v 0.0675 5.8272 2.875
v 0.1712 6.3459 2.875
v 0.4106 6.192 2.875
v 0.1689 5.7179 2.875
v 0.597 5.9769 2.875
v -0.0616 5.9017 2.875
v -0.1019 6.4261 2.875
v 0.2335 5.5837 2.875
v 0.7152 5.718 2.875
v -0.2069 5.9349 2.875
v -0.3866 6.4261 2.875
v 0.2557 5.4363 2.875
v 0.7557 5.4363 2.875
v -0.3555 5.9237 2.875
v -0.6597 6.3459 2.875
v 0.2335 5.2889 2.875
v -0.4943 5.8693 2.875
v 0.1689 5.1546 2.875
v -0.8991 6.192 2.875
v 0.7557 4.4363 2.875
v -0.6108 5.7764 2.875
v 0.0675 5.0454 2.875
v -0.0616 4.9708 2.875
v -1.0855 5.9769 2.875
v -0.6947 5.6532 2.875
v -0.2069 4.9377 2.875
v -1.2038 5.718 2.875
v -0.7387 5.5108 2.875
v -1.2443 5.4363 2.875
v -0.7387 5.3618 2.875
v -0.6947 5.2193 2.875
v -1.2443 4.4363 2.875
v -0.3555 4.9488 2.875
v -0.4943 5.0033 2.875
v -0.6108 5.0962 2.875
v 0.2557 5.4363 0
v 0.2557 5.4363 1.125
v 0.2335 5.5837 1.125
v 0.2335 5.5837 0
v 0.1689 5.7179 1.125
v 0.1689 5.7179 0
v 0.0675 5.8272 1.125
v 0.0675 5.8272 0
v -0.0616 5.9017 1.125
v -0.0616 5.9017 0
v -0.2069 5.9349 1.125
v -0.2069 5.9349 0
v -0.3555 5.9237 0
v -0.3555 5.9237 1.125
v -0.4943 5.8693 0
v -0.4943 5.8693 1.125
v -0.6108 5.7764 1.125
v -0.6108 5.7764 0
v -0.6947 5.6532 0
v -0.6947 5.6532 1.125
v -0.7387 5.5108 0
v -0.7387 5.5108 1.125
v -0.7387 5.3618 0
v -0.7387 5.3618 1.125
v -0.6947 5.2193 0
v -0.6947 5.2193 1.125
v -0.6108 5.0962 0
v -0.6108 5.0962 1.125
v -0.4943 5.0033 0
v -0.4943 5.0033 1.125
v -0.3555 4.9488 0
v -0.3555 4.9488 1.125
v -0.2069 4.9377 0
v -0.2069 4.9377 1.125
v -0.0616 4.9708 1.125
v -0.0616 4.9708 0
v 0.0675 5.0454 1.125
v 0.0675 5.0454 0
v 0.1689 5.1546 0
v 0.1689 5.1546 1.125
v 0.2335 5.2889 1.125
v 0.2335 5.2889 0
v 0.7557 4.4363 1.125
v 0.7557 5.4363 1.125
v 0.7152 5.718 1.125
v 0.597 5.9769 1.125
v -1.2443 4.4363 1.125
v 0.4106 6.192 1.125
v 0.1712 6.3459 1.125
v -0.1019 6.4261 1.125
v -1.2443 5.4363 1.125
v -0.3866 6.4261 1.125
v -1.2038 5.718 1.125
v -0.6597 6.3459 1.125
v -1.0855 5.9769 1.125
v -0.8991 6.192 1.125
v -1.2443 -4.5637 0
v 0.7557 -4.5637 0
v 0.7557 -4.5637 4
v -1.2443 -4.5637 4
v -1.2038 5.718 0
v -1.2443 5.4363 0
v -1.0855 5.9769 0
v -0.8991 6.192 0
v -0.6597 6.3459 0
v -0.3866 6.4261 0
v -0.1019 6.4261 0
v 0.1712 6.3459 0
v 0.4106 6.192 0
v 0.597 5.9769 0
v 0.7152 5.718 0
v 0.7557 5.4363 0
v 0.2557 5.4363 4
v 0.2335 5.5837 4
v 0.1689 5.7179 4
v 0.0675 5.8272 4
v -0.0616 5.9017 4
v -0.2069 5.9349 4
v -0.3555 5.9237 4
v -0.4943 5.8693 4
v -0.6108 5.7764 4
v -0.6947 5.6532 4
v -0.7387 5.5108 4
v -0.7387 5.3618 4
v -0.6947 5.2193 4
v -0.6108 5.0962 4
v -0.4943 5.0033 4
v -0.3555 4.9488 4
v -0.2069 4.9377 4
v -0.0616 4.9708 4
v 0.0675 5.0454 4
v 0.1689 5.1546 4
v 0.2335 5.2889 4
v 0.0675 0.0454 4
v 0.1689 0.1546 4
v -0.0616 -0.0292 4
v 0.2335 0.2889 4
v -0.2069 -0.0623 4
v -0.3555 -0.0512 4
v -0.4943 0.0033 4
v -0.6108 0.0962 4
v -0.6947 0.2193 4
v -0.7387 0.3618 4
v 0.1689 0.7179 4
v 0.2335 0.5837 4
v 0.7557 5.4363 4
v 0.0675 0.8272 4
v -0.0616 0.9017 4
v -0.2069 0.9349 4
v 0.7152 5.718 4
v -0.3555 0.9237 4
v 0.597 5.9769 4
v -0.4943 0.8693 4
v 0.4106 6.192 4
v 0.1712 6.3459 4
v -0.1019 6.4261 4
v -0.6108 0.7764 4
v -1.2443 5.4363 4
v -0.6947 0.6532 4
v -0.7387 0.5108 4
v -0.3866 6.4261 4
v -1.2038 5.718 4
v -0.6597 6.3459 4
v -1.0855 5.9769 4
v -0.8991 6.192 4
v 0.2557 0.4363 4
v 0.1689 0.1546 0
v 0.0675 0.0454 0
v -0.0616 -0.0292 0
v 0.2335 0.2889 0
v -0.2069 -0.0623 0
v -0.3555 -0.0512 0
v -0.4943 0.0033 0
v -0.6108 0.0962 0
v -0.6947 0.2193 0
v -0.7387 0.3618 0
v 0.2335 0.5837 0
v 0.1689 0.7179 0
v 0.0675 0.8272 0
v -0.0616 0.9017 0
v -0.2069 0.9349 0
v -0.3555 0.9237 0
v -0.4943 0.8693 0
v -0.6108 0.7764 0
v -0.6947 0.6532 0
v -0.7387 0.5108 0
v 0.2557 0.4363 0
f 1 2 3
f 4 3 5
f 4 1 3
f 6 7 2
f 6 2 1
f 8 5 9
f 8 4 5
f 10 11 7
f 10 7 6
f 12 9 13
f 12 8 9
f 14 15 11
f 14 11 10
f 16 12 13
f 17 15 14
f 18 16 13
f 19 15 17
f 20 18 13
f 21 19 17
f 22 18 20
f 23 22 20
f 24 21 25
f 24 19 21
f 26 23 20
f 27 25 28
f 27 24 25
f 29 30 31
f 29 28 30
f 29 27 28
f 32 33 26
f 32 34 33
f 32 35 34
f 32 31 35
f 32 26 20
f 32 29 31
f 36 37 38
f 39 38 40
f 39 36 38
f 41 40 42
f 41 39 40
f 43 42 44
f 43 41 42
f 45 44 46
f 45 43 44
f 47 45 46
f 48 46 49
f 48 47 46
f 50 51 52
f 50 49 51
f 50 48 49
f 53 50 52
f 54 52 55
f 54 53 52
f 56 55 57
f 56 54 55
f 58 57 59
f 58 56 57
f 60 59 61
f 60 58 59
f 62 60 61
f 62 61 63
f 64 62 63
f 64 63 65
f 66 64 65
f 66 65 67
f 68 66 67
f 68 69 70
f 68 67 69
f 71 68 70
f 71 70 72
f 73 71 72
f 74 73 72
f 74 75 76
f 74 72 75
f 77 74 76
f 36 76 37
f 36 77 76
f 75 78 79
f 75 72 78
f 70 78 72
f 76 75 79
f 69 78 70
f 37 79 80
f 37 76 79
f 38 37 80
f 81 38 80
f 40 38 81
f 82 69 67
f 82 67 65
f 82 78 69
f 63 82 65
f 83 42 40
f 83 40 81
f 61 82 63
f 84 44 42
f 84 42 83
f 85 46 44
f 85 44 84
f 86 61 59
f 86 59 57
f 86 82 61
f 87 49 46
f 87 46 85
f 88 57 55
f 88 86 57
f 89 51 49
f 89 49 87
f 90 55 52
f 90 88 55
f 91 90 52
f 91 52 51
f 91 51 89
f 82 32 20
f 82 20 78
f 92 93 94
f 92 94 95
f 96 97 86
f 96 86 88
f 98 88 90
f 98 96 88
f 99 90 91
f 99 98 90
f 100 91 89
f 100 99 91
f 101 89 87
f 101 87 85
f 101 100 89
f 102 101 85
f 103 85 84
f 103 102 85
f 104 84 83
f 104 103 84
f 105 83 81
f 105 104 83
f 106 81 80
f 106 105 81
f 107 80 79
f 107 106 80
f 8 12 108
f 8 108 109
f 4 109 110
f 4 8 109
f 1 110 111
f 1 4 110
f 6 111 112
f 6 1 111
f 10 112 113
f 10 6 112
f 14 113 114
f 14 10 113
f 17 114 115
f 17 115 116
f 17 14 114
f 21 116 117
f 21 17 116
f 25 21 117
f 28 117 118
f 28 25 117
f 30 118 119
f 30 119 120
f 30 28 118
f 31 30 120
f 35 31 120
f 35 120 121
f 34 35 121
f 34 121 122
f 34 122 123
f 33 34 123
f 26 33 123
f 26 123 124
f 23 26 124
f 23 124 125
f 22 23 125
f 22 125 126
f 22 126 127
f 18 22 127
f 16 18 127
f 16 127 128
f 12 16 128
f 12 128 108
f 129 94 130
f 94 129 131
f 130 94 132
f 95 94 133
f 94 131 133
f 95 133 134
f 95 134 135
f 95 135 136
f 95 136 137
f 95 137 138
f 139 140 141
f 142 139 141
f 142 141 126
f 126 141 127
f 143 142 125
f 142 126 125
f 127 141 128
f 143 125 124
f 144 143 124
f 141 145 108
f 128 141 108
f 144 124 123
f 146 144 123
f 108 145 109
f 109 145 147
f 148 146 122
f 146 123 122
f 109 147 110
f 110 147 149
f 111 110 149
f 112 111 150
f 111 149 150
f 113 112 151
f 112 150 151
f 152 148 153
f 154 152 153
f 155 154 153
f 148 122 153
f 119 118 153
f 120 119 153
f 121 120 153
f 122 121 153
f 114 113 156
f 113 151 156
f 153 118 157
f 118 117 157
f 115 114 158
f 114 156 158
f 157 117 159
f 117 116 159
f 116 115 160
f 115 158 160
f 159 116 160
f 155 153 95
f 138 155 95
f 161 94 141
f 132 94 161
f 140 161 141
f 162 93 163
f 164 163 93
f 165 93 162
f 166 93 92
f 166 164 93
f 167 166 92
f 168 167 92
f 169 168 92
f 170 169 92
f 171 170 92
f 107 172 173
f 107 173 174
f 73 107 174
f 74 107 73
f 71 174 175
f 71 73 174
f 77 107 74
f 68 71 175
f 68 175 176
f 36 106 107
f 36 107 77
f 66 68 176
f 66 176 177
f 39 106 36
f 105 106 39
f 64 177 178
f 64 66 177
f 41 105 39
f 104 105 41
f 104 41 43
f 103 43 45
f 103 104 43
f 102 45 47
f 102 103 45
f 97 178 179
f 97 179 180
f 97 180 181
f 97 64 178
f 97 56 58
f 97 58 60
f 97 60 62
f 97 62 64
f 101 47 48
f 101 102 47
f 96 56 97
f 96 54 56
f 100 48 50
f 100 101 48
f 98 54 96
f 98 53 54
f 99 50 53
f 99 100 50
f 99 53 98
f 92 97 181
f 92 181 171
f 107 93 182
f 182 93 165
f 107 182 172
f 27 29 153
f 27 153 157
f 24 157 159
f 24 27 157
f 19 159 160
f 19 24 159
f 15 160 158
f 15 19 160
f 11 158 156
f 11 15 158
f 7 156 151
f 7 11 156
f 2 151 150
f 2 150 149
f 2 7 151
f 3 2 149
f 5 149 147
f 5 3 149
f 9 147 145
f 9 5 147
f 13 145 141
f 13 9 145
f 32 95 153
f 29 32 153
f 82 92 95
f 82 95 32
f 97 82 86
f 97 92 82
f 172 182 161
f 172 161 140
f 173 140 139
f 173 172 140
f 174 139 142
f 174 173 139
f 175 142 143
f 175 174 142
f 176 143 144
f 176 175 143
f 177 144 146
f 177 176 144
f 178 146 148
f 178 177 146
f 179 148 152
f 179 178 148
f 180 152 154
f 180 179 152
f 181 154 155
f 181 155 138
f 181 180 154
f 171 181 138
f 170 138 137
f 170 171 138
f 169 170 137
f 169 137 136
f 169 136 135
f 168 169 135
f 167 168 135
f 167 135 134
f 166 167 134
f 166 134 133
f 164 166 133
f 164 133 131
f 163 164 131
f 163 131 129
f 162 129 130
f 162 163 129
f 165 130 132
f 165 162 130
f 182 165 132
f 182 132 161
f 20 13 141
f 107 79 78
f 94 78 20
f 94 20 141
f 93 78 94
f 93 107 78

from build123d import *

# Parameters (mm, degrees)
SKETCH_1_R               = 0.5
EXTRUDE_1_DEPTH          = 4
CUT_EXTRUDE_1_DEPTH      = 8.679442038
CUT_EXTRUDE_1_DEPTH_BACK = 8.679442038


with BuildPart() as part:
    # 草图1 → 凸台-拉伸1 (new body)
    with BuildSketch(Plane.XY):
        with BuildLine():
            Line((-1.244261308, -4.563724383), (-1.244261308, 5.436275617))
            ThreePointArc((-1.244261308, 5.436275617), (-0.244261308, 6.436275617), (0.755738692, 5.436275617))
            Line((0.755738692, 5.436275617), (0.755738692, -4.563724383))
            Line((0.755738692, -4.563724383), (-1.244261308, -4.563724383))
        make_face()
        with Locations((-0.244261308, 5.436275617)):
            Circle(SKETCH_1_R, mode=Mode.SUBTRACT)
        with Locations((-0.244261308, 0.436275617)):
            Circle(SKETCH_1_R, mode=Mode.SUBTRACT)
    extrude(amount=EXTRUDE_1_DEPTH)

    # 草图4 → 切除-拉伸1 (cut, two sides: drawn at the far end of the back side and taken through both)
    with BuildSketch(Plane(origin=(0, 0, 0), x_dir=(0, 0, -1), z_dir=(1, 0, 0)).offset(-CUT_EXTRUDE_1_DEPTH_BACK)):
        Polygon((-2.875, 39.17528395), (-2.875, 6.436275617), (-2.875, 4.436275617), (-1.125, 4.436275617), (-1.125, 6.436275617), (-1.125, 39.17528395), (-1.125, 104.653300618), (-2.875, 104.653300618), align=None)
    extrude(amount=CUT_EXTRUDE_1_DEPTH + CUT_EXTRUDE_1_DEPTH_BACK, mode=Mode.SUBTRACT)


solid = part.part
